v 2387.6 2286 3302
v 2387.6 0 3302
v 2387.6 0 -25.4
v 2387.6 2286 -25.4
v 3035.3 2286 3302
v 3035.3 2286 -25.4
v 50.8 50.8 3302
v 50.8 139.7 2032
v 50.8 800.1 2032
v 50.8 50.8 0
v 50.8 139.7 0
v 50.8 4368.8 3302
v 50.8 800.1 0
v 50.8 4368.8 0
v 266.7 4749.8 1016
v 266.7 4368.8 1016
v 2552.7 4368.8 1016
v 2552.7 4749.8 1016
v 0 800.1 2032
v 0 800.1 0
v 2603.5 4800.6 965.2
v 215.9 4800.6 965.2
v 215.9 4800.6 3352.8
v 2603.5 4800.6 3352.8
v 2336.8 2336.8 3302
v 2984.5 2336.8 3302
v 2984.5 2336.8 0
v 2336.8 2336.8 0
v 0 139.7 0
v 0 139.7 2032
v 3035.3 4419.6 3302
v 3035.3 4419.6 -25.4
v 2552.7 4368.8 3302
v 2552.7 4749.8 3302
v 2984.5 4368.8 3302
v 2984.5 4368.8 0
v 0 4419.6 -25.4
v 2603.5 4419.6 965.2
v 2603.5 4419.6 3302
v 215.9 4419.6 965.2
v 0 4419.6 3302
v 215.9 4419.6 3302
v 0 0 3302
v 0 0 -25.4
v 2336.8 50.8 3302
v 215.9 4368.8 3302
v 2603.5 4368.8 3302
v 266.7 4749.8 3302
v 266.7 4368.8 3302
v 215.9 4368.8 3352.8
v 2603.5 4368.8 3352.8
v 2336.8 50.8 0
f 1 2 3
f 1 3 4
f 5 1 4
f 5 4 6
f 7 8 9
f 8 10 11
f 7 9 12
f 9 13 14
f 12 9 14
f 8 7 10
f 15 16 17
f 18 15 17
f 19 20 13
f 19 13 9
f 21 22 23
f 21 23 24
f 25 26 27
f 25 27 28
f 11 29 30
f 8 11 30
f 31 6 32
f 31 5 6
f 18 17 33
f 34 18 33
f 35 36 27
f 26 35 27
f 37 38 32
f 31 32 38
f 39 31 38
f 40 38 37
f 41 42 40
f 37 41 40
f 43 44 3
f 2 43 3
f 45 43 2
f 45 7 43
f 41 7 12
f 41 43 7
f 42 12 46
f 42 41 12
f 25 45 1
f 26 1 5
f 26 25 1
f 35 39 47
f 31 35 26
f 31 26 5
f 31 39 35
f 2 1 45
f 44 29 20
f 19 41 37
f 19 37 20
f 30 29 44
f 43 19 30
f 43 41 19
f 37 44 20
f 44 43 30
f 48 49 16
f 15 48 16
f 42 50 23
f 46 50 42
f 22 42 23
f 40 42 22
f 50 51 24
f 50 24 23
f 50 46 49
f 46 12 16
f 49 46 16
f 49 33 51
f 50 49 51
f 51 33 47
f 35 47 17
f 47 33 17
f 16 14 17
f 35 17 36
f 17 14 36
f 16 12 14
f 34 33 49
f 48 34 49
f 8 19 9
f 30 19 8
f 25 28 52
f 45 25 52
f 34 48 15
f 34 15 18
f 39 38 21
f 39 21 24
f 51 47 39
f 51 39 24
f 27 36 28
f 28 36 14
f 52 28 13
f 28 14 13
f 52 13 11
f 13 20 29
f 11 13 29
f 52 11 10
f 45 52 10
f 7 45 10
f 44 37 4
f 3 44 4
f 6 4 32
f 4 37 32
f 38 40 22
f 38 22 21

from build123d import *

# Parameters (mm, degrees)
F2_DEPTH = 3302
F3_DEPTH = 25.4
F4_W     = 660.4
F4_H     = 2032
F5_DEPTH = 50.8
F7_DEPTH = 431.8
F9_DEPTH = 381


with BuildPart() as f2:
    # F0 (on Top) → F2 (new body)
    with BuildSketch(Plane.XY):
        Polygon((3035.3, 4419.6), (0, 4419.6), (0, 0), (2387.6, 0), (2387.6, 2286), (3035.3, 2286), align=None)
        Polygon((50.8, 50.8), (50.8, 4368.8), (2984.5, 4368.8), (2984.5, 2336.8), (2336.8, 2336.8), (2336.8, 50.8), align=None, mode=Mode.SUBTRACT)
    extrude(amount=F2_DEPTH)

    # F1 (on face) → F3 (join)
    with BuildSketch(Plane.XY):
        Polygon((0, 4419.6), (0, 0), (2387.6, 0), (2387.6, 2286), (3035.3, 2286), (3035.3, 4419.6), align=None)
    extrude(amount=-F3_DEPTH)

    # F4 (on face) → F5 (cut, through all)
    with BuildSketch(Plane(origin=(0, 0, 0), x_dir=(0, -1, 0), z_dir=(-1, 0, 0))):
        with Locations((-469.9, 1016)):
            Rectangle(F4_W, F4_H)
    extrude(amount=-F5_DEPTH, mode=Mode.SUBTRACT)

    # F6 (on face) → F7 (join)
    with BuildSketch(Plane.XZ.offset(-4368.8)):
        Polygon((2603.5, 965.2), (2603.5, 3352.8), (215.9, 3352.8), (215.9, 2159), (215.9, 965.2), align=None)
    extrude(amount=-F7_DEPTH)

    # F8 (on face) → F9 (cut)
    with BuildSketch(Plane.XZ.offset(-4368.8)):
        Polygon((2552.7, 1016), (2552.7, 3302), (266.7, 3302), (266.7, 2159), (266.7, 1016), align=None)
    extrude(amount=-F9_DEPTH, mode=Mode.SUBTRACT)


solid = f2.part
